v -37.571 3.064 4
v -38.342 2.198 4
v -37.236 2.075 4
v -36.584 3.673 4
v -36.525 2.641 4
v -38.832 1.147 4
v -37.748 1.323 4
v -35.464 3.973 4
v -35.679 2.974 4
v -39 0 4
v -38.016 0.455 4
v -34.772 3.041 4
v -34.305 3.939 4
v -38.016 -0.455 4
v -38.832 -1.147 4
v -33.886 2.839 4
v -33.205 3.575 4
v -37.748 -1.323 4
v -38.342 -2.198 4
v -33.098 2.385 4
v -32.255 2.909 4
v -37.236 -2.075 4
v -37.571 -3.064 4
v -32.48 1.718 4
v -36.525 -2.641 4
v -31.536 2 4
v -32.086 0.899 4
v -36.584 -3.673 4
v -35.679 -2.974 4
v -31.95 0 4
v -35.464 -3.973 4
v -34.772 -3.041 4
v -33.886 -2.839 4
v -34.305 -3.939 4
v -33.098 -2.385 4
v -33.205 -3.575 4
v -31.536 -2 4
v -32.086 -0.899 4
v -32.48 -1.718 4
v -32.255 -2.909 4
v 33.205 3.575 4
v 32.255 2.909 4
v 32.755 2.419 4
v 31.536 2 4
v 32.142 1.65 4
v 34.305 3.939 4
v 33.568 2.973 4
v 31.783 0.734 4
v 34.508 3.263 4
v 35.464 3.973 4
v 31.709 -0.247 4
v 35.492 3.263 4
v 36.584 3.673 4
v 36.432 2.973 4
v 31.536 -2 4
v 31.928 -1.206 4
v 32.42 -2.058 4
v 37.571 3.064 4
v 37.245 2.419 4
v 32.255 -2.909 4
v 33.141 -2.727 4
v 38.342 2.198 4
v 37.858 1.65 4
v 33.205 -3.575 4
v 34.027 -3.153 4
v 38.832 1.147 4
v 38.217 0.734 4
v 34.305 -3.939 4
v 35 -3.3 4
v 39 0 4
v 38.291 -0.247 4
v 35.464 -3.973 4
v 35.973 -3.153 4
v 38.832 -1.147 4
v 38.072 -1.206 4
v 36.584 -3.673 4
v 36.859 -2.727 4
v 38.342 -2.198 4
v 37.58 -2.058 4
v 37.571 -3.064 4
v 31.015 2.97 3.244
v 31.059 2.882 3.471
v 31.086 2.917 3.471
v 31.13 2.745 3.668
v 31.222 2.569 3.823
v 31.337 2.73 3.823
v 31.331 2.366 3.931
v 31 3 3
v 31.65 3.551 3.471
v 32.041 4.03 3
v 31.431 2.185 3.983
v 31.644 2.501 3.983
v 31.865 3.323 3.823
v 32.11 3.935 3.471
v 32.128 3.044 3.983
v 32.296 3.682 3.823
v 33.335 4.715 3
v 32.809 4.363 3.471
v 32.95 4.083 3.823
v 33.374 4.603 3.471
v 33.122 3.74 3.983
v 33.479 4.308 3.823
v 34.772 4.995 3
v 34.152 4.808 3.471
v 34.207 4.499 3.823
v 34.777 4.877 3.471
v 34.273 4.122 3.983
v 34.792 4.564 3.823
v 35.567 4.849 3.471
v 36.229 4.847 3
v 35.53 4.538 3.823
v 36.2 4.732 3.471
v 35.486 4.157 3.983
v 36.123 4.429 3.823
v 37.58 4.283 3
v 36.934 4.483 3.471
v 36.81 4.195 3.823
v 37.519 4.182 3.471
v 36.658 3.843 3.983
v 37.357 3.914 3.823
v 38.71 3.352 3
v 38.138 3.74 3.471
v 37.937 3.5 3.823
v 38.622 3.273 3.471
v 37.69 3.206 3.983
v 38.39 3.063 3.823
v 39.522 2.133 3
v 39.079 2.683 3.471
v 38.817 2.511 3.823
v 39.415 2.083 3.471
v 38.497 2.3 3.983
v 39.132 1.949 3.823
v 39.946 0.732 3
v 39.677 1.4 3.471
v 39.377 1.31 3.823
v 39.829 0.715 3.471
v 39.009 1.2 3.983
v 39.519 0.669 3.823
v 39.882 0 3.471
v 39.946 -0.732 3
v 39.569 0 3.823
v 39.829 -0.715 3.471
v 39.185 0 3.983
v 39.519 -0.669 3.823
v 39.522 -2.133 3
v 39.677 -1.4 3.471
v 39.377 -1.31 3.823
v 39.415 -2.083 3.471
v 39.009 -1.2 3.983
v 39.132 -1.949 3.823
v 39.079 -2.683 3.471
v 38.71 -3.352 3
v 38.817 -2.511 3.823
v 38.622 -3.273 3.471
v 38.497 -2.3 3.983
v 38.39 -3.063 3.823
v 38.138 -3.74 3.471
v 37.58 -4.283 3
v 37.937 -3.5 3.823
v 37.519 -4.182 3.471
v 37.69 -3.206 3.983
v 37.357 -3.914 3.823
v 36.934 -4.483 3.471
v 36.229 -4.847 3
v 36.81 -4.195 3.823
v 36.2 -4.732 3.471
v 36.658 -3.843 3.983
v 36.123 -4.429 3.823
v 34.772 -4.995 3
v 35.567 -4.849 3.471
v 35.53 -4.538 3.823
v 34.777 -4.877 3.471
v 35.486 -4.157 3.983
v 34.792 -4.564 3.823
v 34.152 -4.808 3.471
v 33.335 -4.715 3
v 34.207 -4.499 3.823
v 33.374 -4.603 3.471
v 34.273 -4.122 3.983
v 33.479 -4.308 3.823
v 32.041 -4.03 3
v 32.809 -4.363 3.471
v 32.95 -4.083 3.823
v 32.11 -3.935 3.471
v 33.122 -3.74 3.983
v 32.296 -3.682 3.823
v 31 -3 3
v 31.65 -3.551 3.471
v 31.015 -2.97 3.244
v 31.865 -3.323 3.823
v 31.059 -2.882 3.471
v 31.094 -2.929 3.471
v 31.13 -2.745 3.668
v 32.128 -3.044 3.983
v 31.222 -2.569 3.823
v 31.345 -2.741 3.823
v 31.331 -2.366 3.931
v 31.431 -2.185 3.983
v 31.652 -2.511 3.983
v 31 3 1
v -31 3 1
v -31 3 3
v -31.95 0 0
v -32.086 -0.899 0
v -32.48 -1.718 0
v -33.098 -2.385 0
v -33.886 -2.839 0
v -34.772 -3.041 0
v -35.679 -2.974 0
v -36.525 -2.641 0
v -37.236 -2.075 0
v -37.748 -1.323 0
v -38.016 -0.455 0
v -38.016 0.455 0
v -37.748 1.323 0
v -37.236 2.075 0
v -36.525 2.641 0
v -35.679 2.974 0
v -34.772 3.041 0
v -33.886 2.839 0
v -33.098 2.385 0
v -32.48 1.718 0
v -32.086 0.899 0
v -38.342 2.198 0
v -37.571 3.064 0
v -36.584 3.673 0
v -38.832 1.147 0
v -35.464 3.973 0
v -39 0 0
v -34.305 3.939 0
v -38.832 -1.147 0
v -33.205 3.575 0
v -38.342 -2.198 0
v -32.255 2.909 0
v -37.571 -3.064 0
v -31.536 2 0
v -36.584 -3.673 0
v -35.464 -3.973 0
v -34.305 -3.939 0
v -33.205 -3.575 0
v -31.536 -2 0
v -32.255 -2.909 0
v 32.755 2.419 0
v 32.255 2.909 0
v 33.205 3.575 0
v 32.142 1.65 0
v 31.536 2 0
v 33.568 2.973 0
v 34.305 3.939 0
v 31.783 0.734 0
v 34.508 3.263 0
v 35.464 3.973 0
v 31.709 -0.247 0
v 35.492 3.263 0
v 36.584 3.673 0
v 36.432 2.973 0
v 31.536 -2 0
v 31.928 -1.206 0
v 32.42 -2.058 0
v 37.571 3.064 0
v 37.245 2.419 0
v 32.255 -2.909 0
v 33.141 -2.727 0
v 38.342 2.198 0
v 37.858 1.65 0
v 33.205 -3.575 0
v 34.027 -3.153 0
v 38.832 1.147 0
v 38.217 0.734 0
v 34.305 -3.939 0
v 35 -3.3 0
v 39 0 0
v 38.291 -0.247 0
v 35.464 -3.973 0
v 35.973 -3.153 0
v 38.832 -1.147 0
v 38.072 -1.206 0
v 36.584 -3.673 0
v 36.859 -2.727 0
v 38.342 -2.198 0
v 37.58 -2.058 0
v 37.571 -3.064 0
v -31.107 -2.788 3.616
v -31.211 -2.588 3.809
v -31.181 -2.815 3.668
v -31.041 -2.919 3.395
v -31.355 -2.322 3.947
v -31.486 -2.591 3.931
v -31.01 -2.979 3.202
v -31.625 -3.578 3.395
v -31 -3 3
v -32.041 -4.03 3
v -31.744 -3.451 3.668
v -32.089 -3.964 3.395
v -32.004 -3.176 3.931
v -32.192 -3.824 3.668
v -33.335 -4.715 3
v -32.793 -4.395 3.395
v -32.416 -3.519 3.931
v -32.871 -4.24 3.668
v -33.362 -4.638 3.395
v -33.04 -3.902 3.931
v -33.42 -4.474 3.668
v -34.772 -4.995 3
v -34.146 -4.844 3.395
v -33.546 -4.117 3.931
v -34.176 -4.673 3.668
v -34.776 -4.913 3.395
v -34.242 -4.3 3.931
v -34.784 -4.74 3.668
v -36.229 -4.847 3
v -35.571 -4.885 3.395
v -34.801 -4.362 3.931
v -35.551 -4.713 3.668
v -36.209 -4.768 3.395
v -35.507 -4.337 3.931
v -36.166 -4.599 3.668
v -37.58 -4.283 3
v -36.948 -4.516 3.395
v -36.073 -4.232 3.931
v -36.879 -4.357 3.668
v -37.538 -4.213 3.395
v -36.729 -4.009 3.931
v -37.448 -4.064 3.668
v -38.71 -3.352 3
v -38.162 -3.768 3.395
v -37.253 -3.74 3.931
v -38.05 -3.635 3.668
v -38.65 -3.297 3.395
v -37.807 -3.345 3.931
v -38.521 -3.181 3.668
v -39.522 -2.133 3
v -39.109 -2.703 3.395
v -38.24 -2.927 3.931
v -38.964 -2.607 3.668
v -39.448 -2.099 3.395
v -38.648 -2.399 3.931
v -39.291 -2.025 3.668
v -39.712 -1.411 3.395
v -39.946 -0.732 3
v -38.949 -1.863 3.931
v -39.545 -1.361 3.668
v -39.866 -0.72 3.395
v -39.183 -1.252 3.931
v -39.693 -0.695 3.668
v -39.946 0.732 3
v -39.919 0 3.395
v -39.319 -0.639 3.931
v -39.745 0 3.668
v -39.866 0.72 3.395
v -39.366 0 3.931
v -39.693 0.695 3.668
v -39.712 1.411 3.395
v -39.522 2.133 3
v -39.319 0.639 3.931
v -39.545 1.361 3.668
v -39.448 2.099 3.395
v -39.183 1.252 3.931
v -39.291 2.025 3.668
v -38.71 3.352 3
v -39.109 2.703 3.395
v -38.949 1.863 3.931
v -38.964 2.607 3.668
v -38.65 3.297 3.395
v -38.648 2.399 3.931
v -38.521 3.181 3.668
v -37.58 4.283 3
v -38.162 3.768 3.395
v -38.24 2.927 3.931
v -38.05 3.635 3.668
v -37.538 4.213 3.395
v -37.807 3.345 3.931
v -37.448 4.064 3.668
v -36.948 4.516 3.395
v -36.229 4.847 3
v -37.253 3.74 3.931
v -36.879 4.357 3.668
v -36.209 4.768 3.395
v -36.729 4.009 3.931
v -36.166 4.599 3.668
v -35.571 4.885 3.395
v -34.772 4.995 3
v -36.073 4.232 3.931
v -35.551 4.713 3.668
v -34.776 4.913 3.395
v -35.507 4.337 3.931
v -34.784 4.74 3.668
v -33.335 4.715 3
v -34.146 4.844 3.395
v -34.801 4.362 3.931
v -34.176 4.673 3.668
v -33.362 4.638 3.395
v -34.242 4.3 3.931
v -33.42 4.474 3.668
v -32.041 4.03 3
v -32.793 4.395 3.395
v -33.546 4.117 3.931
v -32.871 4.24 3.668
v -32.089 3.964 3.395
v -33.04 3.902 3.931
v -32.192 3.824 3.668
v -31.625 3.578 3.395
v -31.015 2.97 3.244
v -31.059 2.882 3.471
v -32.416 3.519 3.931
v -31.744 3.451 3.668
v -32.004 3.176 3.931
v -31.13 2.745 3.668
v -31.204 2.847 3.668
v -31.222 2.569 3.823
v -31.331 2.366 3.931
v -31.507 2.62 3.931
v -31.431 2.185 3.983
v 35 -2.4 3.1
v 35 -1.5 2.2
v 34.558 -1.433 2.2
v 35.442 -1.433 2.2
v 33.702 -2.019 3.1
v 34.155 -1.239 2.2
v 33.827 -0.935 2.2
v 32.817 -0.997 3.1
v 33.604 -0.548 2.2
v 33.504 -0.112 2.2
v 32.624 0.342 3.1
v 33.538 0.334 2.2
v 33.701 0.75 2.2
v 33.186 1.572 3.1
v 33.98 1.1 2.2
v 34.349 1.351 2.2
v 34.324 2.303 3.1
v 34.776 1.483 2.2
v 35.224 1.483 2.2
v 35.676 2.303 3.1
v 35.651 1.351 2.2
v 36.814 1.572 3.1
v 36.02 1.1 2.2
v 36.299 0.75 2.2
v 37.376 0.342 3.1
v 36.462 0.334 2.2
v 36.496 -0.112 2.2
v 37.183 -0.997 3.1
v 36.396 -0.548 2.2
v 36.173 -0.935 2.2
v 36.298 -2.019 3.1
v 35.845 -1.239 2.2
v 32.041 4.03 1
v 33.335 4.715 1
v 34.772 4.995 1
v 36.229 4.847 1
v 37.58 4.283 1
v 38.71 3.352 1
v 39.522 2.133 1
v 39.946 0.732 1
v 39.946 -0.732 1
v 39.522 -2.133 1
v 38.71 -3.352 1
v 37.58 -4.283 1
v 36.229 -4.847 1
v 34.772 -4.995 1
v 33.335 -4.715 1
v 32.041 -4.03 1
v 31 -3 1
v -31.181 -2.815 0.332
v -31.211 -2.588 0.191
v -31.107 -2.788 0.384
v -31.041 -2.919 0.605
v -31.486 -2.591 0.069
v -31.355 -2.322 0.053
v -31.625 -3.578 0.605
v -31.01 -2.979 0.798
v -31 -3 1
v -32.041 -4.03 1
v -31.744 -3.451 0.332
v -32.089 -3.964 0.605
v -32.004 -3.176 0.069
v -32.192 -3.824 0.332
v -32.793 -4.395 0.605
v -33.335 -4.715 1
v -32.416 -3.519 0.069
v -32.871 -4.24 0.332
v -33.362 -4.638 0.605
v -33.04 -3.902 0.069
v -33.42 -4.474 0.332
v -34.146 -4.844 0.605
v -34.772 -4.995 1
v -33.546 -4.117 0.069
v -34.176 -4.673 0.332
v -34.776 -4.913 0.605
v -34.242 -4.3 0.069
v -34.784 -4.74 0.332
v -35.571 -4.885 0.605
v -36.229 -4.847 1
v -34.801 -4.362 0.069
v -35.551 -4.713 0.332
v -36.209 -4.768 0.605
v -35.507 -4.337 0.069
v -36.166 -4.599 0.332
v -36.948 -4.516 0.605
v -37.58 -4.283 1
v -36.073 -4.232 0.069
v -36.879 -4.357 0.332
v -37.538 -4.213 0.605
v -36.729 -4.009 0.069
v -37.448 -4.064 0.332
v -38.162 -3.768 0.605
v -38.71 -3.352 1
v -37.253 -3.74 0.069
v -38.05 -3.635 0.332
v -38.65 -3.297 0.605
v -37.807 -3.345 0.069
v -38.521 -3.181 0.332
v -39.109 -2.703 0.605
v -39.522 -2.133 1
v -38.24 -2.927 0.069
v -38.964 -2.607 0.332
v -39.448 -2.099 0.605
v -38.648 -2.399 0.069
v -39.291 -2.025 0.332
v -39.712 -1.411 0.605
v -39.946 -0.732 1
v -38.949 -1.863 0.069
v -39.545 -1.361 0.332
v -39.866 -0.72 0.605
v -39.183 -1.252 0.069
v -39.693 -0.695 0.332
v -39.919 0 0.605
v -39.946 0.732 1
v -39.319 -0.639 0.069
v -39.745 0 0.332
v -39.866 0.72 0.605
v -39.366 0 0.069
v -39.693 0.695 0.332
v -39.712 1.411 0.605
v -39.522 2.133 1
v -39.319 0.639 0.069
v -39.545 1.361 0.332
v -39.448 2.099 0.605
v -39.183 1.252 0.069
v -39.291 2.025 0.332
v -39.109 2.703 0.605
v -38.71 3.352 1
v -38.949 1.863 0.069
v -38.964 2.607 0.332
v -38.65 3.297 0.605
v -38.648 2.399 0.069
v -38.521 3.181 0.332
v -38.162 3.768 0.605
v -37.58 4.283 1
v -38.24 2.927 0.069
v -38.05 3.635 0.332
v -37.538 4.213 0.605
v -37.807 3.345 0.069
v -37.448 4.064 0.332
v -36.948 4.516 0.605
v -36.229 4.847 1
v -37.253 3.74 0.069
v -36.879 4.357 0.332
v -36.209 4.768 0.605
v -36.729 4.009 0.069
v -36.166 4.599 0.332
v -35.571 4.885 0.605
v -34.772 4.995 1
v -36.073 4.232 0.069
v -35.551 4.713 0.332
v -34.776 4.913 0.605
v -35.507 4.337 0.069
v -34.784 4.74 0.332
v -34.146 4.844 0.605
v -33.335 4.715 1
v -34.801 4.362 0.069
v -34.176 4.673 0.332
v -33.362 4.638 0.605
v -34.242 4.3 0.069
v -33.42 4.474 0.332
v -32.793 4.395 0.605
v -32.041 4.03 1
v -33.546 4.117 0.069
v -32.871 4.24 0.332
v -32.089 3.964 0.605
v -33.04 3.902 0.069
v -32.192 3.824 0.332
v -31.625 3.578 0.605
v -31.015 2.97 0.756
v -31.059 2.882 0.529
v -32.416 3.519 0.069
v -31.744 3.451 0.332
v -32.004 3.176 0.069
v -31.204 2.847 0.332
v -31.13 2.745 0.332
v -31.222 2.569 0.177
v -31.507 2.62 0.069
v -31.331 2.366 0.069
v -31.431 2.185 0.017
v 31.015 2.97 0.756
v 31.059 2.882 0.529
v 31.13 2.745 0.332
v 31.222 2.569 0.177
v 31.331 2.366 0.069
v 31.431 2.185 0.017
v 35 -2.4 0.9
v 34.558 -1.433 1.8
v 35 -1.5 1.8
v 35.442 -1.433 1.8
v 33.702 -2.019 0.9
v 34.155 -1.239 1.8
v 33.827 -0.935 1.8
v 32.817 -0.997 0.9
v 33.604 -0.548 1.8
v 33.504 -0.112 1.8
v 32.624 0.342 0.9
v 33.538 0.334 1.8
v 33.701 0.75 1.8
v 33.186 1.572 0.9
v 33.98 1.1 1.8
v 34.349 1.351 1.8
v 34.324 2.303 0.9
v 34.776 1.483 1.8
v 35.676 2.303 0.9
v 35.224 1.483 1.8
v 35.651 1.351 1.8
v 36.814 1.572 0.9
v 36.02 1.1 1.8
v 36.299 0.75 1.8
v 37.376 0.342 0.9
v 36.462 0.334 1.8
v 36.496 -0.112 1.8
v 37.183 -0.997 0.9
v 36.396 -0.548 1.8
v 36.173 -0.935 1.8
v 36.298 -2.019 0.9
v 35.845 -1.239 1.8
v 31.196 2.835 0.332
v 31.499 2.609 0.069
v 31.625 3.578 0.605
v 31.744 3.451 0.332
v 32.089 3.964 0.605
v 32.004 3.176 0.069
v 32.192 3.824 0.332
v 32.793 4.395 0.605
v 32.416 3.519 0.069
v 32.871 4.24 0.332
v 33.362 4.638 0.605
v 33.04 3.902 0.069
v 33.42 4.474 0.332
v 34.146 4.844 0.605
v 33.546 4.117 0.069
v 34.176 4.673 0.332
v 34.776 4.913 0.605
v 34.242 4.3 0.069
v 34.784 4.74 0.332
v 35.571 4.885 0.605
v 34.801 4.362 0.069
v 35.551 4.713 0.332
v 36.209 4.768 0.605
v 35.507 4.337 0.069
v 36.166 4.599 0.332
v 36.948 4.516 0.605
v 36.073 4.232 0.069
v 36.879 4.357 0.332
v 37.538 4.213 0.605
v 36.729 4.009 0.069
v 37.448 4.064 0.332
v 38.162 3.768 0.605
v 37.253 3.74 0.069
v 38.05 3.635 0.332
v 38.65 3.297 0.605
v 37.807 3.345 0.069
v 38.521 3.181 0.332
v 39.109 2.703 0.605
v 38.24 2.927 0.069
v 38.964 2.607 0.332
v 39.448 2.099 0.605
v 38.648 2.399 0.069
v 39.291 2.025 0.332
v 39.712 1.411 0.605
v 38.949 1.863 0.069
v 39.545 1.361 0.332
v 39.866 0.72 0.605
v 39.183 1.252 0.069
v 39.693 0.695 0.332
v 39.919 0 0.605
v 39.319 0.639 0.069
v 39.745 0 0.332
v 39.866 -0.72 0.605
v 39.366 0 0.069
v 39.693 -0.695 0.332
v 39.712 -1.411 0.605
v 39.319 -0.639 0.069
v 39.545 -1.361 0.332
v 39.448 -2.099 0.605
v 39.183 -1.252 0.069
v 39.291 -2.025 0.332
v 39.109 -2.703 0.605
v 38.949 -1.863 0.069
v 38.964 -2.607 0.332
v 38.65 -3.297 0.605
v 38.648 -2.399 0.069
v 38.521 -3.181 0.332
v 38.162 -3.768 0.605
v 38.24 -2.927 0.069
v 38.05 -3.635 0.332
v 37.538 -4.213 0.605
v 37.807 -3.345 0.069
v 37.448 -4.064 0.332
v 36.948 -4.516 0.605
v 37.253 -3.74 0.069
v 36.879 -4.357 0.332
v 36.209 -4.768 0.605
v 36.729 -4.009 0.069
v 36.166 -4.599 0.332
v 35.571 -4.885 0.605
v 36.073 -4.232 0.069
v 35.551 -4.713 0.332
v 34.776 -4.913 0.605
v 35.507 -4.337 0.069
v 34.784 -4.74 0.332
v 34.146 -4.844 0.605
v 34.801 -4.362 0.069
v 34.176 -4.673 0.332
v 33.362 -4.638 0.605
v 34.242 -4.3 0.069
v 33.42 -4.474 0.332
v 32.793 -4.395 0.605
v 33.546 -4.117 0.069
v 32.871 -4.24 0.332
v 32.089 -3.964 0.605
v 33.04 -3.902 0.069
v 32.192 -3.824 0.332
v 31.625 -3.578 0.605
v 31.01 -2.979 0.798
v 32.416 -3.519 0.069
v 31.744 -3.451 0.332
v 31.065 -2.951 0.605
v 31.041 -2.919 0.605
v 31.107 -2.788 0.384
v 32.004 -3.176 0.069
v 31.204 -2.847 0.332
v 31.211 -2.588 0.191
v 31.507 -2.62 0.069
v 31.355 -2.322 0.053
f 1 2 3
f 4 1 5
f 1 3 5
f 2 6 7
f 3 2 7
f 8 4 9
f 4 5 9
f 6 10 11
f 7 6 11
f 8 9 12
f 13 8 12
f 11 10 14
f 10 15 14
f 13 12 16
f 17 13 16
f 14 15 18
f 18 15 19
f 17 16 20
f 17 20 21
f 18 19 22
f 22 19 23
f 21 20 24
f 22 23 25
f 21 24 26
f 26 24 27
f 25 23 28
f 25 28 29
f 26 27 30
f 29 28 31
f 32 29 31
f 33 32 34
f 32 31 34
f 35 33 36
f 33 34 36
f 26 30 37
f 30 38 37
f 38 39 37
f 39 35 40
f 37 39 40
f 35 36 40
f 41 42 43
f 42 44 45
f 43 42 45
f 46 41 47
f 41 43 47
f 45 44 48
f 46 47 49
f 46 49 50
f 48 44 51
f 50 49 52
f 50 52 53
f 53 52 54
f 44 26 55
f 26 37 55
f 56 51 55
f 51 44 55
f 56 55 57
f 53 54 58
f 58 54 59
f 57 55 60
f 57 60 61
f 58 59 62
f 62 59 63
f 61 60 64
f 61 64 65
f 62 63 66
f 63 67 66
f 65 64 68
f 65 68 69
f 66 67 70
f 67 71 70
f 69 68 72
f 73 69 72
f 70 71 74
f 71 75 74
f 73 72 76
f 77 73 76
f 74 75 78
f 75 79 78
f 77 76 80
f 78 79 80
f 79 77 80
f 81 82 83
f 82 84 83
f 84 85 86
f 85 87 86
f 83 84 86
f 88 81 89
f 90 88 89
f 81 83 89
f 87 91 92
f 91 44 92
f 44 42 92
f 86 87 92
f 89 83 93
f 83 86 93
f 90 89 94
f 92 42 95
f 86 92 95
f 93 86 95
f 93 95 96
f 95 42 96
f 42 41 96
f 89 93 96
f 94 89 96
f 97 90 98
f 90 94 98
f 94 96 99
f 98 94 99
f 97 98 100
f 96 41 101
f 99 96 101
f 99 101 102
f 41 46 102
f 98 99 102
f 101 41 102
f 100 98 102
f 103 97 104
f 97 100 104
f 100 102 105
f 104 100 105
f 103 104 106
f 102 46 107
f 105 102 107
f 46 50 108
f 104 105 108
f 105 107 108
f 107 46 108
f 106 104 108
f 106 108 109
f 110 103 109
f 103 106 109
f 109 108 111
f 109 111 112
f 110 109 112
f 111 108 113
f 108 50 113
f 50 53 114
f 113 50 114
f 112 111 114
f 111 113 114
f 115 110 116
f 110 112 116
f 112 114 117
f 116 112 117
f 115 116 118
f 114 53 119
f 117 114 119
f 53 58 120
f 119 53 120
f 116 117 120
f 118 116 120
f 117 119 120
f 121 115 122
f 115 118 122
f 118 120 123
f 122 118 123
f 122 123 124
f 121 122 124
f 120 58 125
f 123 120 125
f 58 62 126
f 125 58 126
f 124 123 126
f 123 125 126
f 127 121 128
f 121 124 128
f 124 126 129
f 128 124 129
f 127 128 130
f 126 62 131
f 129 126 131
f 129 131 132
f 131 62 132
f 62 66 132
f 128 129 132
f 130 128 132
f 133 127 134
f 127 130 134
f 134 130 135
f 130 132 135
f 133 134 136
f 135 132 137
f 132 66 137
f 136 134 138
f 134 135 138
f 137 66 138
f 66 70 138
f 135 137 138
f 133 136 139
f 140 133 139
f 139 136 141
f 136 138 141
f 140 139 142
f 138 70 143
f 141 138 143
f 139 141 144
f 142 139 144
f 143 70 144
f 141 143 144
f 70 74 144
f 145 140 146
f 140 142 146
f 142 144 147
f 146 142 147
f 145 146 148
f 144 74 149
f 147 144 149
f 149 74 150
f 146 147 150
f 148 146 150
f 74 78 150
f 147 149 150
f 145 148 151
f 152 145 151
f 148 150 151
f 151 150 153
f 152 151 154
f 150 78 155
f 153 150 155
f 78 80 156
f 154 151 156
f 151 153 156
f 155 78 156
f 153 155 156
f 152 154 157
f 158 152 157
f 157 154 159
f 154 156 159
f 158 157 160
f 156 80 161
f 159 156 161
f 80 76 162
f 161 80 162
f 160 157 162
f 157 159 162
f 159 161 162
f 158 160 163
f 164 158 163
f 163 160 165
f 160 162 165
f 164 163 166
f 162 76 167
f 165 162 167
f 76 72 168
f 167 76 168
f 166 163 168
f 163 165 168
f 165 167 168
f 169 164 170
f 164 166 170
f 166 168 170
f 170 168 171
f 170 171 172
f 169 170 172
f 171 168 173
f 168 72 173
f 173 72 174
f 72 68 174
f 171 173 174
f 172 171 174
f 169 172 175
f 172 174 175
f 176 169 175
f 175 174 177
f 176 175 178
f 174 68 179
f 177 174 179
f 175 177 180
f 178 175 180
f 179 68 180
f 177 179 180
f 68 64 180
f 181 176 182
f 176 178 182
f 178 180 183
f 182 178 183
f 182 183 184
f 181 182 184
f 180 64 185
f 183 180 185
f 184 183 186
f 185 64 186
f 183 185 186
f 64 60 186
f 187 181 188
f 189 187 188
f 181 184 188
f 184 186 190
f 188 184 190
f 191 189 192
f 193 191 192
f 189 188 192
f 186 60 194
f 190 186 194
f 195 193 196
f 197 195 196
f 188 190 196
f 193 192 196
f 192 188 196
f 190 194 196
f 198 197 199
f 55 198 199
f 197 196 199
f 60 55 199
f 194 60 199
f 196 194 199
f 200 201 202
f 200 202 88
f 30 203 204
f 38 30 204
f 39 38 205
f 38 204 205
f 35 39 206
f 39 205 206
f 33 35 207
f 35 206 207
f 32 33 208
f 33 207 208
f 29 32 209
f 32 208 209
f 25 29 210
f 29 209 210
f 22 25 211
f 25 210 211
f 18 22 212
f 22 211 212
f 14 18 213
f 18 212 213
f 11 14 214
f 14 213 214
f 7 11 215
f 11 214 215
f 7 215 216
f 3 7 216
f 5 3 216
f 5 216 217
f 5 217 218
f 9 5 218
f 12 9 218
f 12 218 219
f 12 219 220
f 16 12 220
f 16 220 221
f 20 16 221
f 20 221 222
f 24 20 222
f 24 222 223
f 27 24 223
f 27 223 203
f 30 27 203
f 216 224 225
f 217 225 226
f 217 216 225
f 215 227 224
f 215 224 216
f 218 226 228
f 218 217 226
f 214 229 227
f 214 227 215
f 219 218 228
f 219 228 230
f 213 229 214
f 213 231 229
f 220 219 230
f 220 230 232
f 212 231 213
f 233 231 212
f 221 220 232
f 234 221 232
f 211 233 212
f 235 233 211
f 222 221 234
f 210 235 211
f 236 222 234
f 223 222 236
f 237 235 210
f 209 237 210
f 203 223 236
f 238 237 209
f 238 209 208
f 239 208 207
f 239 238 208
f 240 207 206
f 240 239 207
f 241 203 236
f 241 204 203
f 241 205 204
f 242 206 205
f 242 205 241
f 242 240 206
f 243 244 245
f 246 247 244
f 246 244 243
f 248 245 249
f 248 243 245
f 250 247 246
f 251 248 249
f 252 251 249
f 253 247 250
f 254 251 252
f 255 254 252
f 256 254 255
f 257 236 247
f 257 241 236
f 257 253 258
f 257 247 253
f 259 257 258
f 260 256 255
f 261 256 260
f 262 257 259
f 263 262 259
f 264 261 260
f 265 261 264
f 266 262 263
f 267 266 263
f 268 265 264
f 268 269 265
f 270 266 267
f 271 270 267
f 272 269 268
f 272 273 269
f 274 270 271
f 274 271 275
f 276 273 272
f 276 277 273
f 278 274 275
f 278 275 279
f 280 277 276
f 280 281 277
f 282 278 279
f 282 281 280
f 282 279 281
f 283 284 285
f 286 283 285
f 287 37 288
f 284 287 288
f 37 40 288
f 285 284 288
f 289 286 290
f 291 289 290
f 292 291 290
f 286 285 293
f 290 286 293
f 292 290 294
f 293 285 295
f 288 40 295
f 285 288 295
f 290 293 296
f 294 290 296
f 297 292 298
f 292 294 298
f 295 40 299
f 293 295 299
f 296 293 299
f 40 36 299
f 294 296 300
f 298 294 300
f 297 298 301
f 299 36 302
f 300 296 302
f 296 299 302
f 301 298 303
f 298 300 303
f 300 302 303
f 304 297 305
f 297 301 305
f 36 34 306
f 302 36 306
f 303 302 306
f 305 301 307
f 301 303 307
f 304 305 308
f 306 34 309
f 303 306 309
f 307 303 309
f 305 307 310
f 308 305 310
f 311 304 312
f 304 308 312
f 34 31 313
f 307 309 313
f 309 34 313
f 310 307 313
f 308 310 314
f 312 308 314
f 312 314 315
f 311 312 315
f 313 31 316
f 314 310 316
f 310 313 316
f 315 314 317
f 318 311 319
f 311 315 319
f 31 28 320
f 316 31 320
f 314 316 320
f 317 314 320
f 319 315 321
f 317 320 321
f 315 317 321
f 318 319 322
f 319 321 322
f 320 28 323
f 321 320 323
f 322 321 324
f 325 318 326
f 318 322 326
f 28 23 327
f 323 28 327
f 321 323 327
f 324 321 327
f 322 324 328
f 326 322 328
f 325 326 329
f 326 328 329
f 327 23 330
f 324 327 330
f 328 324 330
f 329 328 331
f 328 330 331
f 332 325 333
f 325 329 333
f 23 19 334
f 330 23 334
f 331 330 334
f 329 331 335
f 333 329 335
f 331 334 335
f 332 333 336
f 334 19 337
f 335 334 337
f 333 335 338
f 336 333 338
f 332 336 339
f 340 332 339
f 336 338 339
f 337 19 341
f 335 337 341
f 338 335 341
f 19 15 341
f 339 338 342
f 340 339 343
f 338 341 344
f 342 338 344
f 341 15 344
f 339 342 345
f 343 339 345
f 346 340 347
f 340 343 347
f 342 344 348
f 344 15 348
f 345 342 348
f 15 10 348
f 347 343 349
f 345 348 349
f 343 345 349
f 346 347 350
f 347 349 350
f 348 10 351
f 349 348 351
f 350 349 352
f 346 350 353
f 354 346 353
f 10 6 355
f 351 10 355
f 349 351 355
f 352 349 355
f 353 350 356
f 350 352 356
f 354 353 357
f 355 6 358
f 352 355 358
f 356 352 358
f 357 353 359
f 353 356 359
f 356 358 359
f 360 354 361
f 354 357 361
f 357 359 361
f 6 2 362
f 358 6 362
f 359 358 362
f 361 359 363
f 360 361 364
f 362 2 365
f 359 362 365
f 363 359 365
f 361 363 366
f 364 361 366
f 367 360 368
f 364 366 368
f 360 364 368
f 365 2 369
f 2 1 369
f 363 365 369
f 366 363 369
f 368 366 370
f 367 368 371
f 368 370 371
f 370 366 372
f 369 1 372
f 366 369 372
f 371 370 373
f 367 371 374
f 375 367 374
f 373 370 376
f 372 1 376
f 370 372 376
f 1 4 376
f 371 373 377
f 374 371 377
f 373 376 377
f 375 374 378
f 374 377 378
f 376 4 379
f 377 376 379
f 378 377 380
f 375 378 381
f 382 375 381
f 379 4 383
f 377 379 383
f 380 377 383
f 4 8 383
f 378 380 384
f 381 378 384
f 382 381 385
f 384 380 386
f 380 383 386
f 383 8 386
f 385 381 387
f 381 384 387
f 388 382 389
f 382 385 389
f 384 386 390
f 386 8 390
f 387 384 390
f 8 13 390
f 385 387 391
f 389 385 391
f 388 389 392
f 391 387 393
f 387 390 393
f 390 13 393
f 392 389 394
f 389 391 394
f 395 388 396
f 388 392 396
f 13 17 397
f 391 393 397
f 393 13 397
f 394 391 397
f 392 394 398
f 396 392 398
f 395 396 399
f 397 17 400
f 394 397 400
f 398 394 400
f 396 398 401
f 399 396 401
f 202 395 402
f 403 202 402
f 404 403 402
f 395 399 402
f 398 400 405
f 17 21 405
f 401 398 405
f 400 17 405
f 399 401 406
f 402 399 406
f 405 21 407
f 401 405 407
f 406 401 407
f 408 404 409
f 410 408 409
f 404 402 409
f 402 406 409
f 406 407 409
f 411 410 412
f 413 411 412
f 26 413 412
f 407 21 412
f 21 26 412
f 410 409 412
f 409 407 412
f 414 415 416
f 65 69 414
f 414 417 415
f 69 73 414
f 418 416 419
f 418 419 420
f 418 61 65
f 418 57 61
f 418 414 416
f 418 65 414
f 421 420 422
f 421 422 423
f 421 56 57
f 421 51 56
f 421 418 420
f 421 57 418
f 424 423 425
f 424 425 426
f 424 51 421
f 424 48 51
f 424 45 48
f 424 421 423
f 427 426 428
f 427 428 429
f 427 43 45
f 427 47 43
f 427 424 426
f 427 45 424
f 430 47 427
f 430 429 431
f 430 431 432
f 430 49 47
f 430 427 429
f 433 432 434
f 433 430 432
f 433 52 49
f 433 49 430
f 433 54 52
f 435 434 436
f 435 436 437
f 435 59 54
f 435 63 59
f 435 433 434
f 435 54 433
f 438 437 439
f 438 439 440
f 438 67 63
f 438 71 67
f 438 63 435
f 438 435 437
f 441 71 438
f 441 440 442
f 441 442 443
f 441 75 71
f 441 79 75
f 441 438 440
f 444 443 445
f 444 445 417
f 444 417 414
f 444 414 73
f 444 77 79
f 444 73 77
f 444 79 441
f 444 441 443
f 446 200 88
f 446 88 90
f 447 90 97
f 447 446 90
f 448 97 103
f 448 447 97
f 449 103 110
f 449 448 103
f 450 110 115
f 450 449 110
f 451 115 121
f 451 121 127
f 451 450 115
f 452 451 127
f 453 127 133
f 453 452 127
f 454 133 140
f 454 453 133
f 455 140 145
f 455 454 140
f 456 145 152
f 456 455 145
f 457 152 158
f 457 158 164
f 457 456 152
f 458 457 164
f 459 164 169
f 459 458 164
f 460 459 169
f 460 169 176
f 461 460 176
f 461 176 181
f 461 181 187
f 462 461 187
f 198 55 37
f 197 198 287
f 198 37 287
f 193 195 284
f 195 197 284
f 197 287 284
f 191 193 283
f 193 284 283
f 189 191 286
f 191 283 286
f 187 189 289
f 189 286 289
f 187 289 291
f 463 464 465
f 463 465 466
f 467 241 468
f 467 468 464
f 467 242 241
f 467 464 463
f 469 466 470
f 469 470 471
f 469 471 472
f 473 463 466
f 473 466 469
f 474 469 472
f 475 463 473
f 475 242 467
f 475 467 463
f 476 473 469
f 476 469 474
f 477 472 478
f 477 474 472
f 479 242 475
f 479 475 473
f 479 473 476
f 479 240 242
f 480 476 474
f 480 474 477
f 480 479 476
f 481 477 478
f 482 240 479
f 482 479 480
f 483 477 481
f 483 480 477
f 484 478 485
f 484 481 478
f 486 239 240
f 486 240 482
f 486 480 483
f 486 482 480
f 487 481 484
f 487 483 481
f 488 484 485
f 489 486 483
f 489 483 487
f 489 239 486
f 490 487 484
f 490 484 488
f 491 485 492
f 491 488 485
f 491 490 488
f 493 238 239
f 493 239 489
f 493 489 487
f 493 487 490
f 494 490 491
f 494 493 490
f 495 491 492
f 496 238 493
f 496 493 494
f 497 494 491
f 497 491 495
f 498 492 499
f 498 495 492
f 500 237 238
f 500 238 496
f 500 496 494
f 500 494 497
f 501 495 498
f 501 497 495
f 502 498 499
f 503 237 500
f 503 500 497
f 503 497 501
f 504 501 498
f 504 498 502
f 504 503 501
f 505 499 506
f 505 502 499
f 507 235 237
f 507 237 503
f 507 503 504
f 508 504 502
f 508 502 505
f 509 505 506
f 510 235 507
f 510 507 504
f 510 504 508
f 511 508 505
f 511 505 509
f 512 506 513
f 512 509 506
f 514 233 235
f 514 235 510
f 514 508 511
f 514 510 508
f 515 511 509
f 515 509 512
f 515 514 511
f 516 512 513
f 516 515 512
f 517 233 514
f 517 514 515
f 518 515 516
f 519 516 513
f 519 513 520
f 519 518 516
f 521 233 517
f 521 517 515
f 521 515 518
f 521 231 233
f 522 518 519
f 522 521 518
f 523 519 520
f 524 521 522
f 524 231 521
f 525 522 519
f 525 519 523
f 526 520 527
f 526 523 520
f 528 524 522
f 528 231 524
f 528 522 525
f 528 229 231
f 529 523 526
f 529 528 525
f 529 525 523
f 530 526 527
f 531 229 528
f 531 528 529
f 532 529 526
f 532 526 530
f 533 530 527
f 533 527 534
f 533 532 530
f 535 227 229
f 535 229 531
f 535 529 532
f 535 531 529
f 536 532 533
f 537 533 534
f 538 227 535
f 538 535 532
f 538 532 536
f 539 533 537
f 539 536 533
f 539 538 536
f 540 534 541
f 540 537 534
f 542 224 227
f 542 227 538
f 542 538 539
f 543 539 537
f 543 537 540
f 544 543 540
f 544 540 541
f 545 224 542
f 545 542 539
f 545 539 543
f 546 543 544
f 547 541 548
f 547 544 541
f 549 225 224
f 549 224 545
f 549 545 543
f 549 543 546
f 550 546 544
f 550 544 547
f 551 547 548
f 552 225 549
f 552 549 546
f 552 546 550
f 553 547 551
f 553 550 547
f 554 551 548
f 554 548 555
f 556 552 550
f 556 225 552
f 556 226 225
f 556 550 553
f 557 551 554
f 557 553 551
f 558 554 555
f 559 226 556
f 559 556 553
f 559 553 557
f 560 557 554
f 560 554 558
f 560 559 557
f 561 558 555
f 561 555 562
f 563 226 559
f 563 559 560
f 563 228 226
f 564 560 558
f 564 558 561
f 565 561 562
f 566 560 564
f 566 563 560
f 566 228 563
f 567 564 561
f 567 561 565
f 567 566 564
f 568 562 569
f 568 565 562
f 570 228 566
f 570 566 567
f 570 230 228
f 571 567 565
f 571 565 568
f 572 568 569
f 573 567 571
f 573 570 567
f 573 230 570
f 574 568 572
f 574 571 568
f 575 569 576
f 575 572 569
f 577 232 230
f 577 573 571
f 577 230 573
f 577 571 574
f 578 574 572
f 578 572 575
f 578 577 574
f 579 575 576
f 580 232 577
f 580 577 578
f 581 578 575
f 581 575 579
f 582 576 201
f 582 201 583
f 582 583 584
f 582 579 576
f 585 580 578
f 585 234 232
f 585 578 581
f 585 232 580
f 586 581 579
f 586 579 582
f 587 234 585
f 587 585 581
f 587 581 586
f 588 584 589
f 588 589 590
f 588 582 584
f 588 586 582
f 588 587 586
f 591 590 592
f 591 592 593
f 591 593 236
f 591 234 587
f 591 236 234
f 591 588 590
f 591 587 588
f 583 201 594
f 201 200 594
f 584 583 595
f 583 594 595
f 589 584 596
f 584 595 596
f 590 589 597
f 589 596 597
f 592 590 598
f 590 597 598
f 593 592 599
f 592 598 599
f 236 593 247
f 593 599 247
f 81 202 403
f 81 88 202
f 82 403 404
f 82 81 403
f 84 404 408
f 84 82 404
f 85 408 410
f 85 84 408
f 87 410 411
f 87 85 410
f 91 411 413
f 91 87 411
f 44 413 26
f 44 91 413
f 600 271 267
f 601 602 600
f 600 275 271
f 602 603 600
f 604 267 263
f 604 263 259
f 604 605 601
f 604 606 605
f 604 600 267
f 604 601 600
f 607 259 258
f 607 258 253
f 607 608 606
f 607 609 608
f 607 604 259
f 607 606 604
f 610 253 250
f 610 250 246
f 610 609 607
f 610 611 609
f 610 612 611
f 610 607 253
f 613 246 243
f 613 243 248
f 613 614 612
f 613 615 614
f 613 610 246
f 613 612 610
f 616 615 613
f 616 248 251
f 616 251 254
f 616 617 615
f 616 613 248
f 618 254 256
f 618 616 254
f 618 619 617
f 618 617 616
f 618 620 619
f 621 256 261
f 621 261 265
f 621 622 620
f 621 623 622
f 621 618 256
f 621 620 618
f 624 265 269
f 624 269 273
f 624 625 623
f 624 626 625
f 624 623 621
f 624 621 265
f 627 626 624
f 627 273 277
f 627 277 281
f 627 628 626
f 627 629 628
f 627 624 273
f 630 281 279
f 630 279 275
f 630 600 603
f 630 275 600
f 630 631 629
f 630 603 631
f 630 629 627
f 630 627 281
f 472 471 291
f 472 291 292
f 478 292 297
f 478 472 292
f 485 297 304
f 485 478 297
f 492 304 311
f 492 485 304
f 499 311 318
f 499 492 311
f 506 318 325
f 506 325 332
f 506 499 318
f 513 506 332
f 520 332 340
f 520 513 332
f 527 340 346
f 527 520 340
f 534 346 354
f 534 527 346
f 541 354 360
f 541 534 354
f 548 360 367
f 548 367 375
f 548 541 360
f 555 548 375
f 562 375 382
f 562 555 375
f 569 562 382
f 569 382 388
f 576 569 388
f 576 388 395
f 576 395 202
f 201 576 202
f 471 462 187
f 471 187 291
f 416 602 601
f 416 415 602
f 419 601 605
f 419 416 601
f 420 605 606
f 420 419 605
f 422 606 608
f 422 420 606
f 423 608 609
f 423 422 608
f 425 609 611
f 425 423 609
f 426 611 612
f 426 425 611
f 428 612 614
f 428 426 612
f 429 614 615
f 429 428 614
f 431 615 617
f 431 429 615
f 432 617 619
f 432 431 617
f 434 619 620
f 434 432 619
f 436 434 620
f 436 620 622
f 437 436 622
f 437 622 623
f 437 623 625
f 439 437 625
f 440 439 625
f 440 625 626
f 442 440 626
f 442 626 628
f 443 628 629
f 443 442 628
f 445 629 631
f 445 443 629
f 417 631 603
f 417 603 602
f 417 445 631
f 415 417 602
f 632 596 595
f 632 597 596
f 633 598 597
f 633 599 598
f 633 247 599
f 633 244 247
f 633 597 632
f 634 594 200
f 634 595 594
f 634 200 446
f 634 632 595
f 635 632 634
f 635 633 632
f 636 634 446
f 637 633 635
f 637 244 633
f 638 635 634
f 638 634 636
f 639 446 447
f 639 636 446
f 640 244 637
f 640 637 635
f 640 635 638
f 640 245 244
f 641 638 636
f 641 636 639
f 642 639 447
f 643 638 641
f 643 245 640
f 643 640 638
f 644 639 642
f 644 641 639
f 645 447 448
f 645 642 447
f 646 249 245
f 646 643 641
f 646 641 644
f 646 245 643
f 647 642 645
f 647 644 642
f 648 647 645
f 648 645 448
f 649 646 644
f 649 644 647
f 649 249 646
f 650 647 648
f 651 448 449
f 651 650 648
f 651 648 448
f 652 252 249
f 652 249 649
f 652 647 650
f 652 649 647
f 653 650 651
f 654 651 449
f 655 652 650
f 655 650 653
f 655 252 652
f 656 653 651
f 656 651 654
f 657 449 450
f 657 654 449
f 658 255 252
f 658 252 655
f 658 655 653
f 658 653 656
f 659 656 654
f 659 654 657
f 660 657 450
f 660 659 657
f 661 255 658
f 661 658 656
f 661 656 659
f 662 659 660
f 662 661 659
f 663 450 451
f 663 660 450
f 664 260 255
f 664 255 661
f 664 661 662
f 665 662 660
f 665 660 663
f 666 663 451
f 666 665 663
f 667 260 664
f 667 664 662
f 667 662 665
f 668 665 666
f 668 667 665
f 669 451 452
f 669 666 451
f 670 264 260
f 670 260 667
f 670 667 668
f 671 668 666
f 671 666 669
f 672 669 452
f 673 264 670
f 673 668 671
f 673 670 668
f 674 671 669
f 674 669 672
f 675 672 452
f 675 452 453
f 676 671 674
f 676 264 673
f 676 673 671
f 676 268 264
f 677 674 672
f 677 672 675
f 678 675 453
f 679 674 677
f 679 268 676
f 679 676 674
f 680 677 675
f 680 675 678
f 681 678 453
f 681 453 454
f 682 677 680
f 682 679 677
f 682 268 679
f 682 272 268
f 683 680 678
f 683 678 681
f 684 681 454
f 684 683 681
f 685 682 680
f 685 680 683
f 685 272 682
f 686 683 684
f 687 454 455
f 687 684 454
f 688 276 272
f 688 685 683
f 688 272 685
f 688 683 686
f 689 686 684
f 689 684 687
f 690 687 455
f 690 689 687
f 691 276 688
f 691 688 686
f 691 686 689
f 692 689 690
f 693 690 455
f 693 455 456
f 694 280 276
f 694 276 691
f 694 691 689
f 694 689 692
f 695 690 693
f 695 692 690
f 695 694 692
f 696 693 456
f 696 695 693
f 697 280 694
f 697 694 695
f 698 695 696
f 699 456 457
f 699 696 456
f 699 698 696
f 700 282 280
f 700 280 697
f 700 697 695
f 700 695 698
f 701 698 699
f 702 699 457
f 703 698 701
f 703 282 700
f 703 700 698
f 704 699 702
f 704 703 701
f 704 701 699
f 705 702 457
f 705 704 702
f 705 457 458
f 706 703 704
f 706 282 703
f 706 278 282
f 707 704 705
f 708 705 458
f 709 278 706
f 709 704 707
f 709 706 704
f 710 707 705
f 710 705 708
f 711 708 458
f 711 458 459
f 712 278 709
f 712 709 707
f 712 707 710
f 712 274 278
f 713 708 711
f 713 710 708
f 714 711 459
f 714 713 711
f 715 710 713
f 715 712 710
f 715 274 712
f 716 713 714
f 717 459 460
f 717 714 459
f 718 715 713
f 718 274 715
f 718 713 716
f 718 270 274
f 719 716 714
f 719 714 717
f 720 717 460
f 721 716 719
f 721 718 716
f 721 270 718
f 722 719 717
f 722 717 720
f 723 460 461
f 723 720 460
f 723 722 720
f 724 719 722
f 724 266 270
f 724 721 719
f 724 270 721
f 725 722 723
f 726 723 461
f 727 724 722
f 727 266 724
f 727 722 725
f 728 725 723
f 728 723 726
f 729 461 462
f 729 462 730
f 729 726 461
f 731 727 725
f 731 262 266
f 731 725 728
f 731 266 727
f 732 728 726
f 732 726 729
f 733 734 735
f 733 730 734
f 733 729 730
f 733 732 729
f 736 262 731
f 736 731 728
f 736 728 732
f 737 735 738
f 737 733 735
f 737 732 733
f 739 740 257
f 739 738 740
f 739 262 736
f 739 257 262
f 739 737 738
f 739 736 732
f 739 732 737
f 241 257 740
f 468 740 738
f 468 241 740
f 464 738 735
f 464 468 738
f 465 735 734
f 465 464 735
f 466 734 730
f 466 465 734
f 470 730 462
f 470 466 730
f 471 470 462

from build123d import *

# Parameters (mm, degrees)
BOSS_EXTRU_1_DEPTH              = 4
DIAM_TRE_DU_PER_AGE_6_1_6_1_1_D = 6.1
CONG_1_R                        = 1


with BuildPart() as part:
    # Esquisse1 → Boss.-Extru.1 (new body)
    with BuildSketch(Plane(origin=(0, 2, 0), x_dir=(1, 0, 0), z_dir=(0, 0, -1))):
        with BuildLine():
            Line((-31, -1), (31, -1))
            ThreePointArc((31, -1), (40, 2), (31, 5))
            Line((31, 5), (-31, 5))
            ThreePointArc((-31, 5), (-40, 2), (-31, -1))
        make_face()
    extrude(amount=-BOSS_EXTRU_1_DEPTH)

    # Diamètre du perçage Ø6.1 (6.1)1 (through all)
    with Locations(Plane(origin=(0, 0, 4), x_dir=(-1, 0, 0), z_dir=(0, 0, 1))):
        with Locations((35, 0)):
            Hole(DIAM_TRE_DU_PER_AGE_6_1_6_1_1_D / 2)

    # Esquisse4 → Fraisage pour vis à tête fraisée M2.51 (revolve, cut)
    with BuildSketch(Plane(origin=(35, 0, 4), x_dir=(0, -1, 0), z_dir=(1, 0, 0))):
        Polygon((0, 0), (0, 4), (3.3, 4), (1.5, 2.2), (1.5, 1.8), (3.3, 0), align=None)
    revolve(axis=Axis((35, 0, 10.35), (0, 0, -1)), mode=Mode.SUBTRACT)

    # Congé1
    cong_1_edges = [part.edges().sort_by_distance(p)[0] for p in [
        (40, 0, 4),
        (0, -3, 4),
        (-40, 0, 4),
        (0, -3, 0),
        (40, 0, 0),
        (0, 3, 0),
        (-40, 0, 0),
        (0, 3, 4),
    ]]
    fillet(cong_1_edges, radius=CONG_1_R)


solid = part.part
